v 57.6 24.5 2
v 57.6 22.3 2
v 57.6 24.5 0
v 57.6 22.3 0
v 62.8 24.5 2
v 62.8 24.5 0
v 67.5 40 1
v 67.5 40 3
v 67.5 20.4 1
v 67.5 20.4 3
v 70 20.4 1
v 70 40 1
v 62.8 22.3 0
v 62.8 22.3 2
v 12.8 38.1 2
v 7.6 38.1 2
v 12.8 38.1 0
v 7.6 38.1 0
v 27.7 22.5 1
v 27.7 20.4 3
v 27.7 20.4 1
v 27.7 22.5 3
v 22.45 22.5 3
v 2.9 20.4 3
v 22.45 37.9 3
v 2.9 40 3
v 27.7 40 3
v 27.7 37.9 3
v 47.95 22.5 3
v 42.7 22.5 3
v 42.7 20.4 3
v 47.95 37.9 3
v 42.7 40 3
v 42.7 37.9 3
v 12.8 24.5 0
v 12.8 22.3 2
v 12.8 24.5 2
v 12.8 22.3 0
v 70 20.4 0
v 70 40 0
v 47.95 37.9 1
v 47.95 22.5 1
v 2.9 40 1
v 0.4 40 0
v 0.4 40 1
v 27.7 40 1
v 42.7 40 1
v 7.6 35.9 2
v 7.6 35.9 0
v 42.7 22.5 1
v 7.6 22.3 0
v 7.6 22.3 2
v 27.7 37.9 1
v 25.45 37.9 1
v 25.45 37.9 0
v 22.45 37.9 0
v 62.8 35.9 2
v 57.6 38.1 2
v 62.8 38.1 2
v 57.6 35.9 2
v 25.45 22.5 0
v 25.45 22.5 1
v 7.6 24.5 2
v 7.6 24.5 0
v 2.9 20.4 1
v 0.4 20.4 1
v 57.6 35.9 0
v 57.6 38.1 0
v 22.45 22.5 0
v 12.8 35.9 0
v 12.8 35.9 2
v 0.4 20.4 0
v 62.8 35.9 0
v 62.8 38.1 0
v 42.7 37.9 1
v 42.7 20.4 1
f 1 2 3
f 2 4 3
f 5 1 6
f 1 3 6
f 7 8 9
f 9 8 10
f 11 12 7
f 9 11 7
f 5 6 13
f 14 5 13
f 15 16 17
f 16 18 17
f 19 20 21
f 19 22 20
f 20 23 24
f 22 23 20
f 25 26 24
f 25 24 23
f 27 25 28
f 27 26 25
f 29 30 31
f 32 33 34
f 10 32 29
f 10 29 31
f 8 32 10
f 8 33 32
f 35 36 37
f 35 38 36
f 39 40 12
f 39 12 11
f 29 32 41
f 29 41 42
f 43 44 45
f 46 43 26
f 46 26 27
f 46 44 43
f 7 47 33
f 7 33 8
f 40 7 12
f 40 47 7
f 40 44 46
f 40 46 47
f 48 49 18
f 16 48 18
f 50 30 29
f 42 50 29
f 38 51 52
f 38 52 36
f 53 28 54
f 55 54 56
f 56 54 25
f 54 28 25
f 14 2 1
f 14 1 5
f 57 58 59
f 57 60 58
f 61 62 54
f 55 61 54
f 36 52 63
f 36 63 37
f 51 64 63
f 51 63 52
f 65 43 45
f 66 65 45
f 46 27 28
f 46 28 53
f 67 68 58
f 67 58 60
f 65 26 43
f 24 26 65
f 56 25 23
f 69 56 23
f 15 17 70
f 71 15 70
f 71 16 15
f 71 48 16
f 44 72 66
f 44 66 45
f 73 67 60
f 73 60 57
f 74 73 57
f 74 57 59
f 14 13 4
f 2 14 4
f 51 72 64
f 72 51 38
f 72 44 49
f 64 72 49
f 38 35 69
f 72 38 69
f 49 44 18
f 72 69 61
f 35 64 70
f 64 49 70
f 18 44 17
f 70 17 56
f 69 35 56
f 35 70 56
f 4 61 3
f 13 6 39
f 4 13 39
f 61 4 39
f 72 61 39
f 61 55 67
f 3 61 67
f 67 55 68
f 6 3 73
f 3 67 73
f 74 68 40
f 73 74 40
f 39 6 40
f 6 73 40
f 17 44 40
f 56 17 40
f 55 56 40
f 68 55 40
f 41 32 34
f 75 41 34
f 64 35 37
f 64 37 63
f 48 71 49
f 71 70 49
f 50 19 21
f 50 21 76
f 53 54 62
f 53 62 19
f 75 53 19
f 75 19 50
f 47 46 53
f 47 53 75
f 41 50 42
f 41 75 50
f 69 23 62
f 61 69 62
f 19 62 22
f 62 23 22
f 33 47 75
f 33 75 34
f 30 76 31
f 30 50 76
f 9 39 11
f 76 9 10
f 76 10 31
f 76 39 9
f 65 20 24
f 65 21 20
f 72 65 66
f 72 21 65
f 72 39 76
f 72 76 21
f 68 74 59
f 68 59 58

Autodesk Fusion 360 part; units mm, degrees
sketch "Esquisse1" plane through (0, 0, 0) normal (0, 0, 1) x (1, 0, 0)
  line L0 (0.4, 40) -> (70, 40)
  line L1 (70, 40) -> (70, 20.4)
  line L2 (70, 20.4) -> (0.4, 20.4)
  line L3 (0.4, 20.4) -> (0.4, 40)
  dimension "d1" = 69.6
  dimension "d2" = 19.6
extrude "Extrusion1" add sketch "Esquisse1" along normal blind 3
sketch "Esquisse2" plane through (0, 0, 0) normal (0, 0, -1) x (1, 0, 0)
  line L0 (70, -20.4) -> (0.4, -20.4)
  line L1 (0.4, -20.4) -> (0.4, -40)
  line L2 (0.4, -40) -> (70, -40)
  line L3 (70, -40) -> (70, -20.4)
  line L4 (7.6, -22.3) -> (12.8, -22.3)
  line L5 (12.8, -22.3) -> (12.8, -24.5)
  line L6 (12.8, -24.5) -> (7.6, -24.5)
  line L7 (7.6, -24.5) -> (7.6, -22.3)
  line L8 (10.2, -22.3) -> (10.2, -24.5) construction
  line L9 (35.2, -20.4) -> (35.2, -40) construction
  line L10 (57.6, -22.3) -> (57.6, -24.5)
  line L11 (62.8, -22.3) -> (57.6, -22.3)
  line L12 (62.8, -24.5) -> (62.8, -22.3)
  line L13 (57.6, -24.5) -> (62.8, -24.5)
  line L14 (0.4, -30.2) -> (70, -30.2) construction
  line L15 (7.6, -38.1) -> (12.8, -38.1)
  line L16 (12.8, -38.1) -> (12.8, -35.9)
  line L17 (12.8, -35.9) -> (7.6, -35.9)
  line L18 (7.6, -35.9) -> (7.6, -38.1)
  line L19 (62.8, -38.1) -> (57.6, -38.1)
  line L20 (62.8, -35.9) -> (62.8, -38.1)
  line L21 (57.6, -35.9) -> (62.8, -35.9)
  line L22 (57.6, -38.1) -> (57.6, -35.9)
  dimension "d5" = 25
  dimension "d12" = 5.2
  dimension "d13" = 2.2
  dimension "d14" = 1.9
extrude "Extrusion2" cut sketch "Esquisse2" against normal blind 2 contours L4 L5 L6 L7 | L10 L11 L12 L13 | L15 L16 L17 L18 | L19 L20 L21 L22
sketch "Esquisse3" plane through (0, 0, 3) normal (0, 0, 1) x (-1, 0, 0)
  line L0 (-0.4, -20.4) -> (-70, -20.4)
  line L1 (-70, -20.4) -> (-70, -40)
  line L2 (-70, -40) -> (-0.4, -40)
  line L3 (-0.4, -40) -> (-0.4, -20.4)
  line L4 (-22.45, -37.9) -> (-47.95, -37.9)
  line L5 (-47.95, -37.9) -> (-47.95, -22.5)
  line L6 (-47.95, -22.5) -> (-22.45, -22.5)
  line L7 (-22.45, -22.5) -> (-22.45, -37.9)
  line L8 (-0.4, -30.2) -> (-70, -30.2) construction
  line L9 (-35.2, -40) -> (-35.2, -20.4) construction
  dimension "d8" = 25.5
  dimension "d9" = 15.4
extrude "Extrusion3" cut sketch "Esquisse3" against normal blind 2 contours L4 L5 L6 L7
sketch "Esquisse4" plane through (0, 0, 1) normal (0, 0, 1) x (-1, 0, 0)
  line L0 (-22.45, -22.5) -> (-47.95, -22.5)
  line L1 (-47.95, -22.5) -> (-47.95, -37.9)
  line L2 (-47.95, -37.9) -> (-22.45, -37.9)
  line L3 (-22.45, -37.9) -> (-22.45, -22.5)
  line L4 (-22.45, -22.5) -> (-25.45, -22.5)
  line L5 (-25.45, -22.5) -> (-25.45, -37.9)
  line L6 (-25.45, -37.9) -> (-22.45, -37.9)
  line L7 (-22.45, -37.9) -> (-22.45, -22.5)
  dimension "d15" = 3
extrude "Extrusion4" cut sketch "Esquisse4" against normal blind 3 contours L0 L2 L3 L4 L5 L6 L7
sketch "Esquisse5" plane through (0, 40, 0) normal (0, 1, 0) x (-1, 0, 0)
  line L0 (-70, 0) -> (-0.4, 0)
  line L1 (-0.4, 0) -> (-0.4, 3)
  line L2 (-0.4, 3) -> (-70, 3)
  line L3 (-70, 3) -> (-70, 0)
  line L4 (-35.2, 3) -> (-35.2, 0) construction
  line L5 (-42.7, 3) -> (-27.7, 3)
  line L6 (-27.7, 3) -> (-27.7, 1)
  line L7 (-27.7, 1) -> (-42.7, 1)
  line L8 (-42.7, 1) -> (-42.7, 3)
  dimension "d18" = 15
  dimension "d19" = 2
extrude "Extrusion5" cut sketch "Esquisse5" against normal blind 21 contours L2 L5 L6 L7 L8
sketch "Esquisse6" plane through (0, 0, 3) normal (0, 0, 1) x (-1, 0, 0)
  line L0 (-42.7, -22.5) -> (-42.7, -20.4)
  line L1 (-42.7, -20.4) -> (-70, -20.4)
  line L2 (-70, -20.4) -> (-70, -40)
  line L3 (-70, -40) -> (-42.7, -40)
  line L4 (-42.7, -40) -> (-42.7, -37.9)
  line L5 (-42.7, -37.9) -> (-47.95, -37.9)
  line L6 (-47.95, -37.9) -> (-47.95, -22.5)
  line L7 (-47.95, -22.5) -> (-42.7, -22.5)
  line L8 (-70, -40) -> (-67.5, -40)
  line L9 (-67.5, -40) -> (-67.5, -20.4)
  line L10 (-67.5, -20.4) -> (-70, -20.4)
  line L11 (-70, -20.4) -> (-70, -40)
  line L12 (-35.2, -39) -> (-35.2, -18) construction
  line L13 (-0.4, -20.4) -> (-0.4, -40)
  line L14 (-2.9, -20.4) -> (-0.4, -20.4)
  line L15 (-2.9, -40) -> (-2.9, -20.4)
  line L16 (-0.4, -40) -> (-2.9, -40)
  dimension "d22" = 2.5
  dimension "d23" = 34.8
extrude "Extrusion6" cut sketch "Esquisse6" against normal blind 2 contours L1 L2 L3 L8 L9 L10 L11 | L13 L14 L15 L16
